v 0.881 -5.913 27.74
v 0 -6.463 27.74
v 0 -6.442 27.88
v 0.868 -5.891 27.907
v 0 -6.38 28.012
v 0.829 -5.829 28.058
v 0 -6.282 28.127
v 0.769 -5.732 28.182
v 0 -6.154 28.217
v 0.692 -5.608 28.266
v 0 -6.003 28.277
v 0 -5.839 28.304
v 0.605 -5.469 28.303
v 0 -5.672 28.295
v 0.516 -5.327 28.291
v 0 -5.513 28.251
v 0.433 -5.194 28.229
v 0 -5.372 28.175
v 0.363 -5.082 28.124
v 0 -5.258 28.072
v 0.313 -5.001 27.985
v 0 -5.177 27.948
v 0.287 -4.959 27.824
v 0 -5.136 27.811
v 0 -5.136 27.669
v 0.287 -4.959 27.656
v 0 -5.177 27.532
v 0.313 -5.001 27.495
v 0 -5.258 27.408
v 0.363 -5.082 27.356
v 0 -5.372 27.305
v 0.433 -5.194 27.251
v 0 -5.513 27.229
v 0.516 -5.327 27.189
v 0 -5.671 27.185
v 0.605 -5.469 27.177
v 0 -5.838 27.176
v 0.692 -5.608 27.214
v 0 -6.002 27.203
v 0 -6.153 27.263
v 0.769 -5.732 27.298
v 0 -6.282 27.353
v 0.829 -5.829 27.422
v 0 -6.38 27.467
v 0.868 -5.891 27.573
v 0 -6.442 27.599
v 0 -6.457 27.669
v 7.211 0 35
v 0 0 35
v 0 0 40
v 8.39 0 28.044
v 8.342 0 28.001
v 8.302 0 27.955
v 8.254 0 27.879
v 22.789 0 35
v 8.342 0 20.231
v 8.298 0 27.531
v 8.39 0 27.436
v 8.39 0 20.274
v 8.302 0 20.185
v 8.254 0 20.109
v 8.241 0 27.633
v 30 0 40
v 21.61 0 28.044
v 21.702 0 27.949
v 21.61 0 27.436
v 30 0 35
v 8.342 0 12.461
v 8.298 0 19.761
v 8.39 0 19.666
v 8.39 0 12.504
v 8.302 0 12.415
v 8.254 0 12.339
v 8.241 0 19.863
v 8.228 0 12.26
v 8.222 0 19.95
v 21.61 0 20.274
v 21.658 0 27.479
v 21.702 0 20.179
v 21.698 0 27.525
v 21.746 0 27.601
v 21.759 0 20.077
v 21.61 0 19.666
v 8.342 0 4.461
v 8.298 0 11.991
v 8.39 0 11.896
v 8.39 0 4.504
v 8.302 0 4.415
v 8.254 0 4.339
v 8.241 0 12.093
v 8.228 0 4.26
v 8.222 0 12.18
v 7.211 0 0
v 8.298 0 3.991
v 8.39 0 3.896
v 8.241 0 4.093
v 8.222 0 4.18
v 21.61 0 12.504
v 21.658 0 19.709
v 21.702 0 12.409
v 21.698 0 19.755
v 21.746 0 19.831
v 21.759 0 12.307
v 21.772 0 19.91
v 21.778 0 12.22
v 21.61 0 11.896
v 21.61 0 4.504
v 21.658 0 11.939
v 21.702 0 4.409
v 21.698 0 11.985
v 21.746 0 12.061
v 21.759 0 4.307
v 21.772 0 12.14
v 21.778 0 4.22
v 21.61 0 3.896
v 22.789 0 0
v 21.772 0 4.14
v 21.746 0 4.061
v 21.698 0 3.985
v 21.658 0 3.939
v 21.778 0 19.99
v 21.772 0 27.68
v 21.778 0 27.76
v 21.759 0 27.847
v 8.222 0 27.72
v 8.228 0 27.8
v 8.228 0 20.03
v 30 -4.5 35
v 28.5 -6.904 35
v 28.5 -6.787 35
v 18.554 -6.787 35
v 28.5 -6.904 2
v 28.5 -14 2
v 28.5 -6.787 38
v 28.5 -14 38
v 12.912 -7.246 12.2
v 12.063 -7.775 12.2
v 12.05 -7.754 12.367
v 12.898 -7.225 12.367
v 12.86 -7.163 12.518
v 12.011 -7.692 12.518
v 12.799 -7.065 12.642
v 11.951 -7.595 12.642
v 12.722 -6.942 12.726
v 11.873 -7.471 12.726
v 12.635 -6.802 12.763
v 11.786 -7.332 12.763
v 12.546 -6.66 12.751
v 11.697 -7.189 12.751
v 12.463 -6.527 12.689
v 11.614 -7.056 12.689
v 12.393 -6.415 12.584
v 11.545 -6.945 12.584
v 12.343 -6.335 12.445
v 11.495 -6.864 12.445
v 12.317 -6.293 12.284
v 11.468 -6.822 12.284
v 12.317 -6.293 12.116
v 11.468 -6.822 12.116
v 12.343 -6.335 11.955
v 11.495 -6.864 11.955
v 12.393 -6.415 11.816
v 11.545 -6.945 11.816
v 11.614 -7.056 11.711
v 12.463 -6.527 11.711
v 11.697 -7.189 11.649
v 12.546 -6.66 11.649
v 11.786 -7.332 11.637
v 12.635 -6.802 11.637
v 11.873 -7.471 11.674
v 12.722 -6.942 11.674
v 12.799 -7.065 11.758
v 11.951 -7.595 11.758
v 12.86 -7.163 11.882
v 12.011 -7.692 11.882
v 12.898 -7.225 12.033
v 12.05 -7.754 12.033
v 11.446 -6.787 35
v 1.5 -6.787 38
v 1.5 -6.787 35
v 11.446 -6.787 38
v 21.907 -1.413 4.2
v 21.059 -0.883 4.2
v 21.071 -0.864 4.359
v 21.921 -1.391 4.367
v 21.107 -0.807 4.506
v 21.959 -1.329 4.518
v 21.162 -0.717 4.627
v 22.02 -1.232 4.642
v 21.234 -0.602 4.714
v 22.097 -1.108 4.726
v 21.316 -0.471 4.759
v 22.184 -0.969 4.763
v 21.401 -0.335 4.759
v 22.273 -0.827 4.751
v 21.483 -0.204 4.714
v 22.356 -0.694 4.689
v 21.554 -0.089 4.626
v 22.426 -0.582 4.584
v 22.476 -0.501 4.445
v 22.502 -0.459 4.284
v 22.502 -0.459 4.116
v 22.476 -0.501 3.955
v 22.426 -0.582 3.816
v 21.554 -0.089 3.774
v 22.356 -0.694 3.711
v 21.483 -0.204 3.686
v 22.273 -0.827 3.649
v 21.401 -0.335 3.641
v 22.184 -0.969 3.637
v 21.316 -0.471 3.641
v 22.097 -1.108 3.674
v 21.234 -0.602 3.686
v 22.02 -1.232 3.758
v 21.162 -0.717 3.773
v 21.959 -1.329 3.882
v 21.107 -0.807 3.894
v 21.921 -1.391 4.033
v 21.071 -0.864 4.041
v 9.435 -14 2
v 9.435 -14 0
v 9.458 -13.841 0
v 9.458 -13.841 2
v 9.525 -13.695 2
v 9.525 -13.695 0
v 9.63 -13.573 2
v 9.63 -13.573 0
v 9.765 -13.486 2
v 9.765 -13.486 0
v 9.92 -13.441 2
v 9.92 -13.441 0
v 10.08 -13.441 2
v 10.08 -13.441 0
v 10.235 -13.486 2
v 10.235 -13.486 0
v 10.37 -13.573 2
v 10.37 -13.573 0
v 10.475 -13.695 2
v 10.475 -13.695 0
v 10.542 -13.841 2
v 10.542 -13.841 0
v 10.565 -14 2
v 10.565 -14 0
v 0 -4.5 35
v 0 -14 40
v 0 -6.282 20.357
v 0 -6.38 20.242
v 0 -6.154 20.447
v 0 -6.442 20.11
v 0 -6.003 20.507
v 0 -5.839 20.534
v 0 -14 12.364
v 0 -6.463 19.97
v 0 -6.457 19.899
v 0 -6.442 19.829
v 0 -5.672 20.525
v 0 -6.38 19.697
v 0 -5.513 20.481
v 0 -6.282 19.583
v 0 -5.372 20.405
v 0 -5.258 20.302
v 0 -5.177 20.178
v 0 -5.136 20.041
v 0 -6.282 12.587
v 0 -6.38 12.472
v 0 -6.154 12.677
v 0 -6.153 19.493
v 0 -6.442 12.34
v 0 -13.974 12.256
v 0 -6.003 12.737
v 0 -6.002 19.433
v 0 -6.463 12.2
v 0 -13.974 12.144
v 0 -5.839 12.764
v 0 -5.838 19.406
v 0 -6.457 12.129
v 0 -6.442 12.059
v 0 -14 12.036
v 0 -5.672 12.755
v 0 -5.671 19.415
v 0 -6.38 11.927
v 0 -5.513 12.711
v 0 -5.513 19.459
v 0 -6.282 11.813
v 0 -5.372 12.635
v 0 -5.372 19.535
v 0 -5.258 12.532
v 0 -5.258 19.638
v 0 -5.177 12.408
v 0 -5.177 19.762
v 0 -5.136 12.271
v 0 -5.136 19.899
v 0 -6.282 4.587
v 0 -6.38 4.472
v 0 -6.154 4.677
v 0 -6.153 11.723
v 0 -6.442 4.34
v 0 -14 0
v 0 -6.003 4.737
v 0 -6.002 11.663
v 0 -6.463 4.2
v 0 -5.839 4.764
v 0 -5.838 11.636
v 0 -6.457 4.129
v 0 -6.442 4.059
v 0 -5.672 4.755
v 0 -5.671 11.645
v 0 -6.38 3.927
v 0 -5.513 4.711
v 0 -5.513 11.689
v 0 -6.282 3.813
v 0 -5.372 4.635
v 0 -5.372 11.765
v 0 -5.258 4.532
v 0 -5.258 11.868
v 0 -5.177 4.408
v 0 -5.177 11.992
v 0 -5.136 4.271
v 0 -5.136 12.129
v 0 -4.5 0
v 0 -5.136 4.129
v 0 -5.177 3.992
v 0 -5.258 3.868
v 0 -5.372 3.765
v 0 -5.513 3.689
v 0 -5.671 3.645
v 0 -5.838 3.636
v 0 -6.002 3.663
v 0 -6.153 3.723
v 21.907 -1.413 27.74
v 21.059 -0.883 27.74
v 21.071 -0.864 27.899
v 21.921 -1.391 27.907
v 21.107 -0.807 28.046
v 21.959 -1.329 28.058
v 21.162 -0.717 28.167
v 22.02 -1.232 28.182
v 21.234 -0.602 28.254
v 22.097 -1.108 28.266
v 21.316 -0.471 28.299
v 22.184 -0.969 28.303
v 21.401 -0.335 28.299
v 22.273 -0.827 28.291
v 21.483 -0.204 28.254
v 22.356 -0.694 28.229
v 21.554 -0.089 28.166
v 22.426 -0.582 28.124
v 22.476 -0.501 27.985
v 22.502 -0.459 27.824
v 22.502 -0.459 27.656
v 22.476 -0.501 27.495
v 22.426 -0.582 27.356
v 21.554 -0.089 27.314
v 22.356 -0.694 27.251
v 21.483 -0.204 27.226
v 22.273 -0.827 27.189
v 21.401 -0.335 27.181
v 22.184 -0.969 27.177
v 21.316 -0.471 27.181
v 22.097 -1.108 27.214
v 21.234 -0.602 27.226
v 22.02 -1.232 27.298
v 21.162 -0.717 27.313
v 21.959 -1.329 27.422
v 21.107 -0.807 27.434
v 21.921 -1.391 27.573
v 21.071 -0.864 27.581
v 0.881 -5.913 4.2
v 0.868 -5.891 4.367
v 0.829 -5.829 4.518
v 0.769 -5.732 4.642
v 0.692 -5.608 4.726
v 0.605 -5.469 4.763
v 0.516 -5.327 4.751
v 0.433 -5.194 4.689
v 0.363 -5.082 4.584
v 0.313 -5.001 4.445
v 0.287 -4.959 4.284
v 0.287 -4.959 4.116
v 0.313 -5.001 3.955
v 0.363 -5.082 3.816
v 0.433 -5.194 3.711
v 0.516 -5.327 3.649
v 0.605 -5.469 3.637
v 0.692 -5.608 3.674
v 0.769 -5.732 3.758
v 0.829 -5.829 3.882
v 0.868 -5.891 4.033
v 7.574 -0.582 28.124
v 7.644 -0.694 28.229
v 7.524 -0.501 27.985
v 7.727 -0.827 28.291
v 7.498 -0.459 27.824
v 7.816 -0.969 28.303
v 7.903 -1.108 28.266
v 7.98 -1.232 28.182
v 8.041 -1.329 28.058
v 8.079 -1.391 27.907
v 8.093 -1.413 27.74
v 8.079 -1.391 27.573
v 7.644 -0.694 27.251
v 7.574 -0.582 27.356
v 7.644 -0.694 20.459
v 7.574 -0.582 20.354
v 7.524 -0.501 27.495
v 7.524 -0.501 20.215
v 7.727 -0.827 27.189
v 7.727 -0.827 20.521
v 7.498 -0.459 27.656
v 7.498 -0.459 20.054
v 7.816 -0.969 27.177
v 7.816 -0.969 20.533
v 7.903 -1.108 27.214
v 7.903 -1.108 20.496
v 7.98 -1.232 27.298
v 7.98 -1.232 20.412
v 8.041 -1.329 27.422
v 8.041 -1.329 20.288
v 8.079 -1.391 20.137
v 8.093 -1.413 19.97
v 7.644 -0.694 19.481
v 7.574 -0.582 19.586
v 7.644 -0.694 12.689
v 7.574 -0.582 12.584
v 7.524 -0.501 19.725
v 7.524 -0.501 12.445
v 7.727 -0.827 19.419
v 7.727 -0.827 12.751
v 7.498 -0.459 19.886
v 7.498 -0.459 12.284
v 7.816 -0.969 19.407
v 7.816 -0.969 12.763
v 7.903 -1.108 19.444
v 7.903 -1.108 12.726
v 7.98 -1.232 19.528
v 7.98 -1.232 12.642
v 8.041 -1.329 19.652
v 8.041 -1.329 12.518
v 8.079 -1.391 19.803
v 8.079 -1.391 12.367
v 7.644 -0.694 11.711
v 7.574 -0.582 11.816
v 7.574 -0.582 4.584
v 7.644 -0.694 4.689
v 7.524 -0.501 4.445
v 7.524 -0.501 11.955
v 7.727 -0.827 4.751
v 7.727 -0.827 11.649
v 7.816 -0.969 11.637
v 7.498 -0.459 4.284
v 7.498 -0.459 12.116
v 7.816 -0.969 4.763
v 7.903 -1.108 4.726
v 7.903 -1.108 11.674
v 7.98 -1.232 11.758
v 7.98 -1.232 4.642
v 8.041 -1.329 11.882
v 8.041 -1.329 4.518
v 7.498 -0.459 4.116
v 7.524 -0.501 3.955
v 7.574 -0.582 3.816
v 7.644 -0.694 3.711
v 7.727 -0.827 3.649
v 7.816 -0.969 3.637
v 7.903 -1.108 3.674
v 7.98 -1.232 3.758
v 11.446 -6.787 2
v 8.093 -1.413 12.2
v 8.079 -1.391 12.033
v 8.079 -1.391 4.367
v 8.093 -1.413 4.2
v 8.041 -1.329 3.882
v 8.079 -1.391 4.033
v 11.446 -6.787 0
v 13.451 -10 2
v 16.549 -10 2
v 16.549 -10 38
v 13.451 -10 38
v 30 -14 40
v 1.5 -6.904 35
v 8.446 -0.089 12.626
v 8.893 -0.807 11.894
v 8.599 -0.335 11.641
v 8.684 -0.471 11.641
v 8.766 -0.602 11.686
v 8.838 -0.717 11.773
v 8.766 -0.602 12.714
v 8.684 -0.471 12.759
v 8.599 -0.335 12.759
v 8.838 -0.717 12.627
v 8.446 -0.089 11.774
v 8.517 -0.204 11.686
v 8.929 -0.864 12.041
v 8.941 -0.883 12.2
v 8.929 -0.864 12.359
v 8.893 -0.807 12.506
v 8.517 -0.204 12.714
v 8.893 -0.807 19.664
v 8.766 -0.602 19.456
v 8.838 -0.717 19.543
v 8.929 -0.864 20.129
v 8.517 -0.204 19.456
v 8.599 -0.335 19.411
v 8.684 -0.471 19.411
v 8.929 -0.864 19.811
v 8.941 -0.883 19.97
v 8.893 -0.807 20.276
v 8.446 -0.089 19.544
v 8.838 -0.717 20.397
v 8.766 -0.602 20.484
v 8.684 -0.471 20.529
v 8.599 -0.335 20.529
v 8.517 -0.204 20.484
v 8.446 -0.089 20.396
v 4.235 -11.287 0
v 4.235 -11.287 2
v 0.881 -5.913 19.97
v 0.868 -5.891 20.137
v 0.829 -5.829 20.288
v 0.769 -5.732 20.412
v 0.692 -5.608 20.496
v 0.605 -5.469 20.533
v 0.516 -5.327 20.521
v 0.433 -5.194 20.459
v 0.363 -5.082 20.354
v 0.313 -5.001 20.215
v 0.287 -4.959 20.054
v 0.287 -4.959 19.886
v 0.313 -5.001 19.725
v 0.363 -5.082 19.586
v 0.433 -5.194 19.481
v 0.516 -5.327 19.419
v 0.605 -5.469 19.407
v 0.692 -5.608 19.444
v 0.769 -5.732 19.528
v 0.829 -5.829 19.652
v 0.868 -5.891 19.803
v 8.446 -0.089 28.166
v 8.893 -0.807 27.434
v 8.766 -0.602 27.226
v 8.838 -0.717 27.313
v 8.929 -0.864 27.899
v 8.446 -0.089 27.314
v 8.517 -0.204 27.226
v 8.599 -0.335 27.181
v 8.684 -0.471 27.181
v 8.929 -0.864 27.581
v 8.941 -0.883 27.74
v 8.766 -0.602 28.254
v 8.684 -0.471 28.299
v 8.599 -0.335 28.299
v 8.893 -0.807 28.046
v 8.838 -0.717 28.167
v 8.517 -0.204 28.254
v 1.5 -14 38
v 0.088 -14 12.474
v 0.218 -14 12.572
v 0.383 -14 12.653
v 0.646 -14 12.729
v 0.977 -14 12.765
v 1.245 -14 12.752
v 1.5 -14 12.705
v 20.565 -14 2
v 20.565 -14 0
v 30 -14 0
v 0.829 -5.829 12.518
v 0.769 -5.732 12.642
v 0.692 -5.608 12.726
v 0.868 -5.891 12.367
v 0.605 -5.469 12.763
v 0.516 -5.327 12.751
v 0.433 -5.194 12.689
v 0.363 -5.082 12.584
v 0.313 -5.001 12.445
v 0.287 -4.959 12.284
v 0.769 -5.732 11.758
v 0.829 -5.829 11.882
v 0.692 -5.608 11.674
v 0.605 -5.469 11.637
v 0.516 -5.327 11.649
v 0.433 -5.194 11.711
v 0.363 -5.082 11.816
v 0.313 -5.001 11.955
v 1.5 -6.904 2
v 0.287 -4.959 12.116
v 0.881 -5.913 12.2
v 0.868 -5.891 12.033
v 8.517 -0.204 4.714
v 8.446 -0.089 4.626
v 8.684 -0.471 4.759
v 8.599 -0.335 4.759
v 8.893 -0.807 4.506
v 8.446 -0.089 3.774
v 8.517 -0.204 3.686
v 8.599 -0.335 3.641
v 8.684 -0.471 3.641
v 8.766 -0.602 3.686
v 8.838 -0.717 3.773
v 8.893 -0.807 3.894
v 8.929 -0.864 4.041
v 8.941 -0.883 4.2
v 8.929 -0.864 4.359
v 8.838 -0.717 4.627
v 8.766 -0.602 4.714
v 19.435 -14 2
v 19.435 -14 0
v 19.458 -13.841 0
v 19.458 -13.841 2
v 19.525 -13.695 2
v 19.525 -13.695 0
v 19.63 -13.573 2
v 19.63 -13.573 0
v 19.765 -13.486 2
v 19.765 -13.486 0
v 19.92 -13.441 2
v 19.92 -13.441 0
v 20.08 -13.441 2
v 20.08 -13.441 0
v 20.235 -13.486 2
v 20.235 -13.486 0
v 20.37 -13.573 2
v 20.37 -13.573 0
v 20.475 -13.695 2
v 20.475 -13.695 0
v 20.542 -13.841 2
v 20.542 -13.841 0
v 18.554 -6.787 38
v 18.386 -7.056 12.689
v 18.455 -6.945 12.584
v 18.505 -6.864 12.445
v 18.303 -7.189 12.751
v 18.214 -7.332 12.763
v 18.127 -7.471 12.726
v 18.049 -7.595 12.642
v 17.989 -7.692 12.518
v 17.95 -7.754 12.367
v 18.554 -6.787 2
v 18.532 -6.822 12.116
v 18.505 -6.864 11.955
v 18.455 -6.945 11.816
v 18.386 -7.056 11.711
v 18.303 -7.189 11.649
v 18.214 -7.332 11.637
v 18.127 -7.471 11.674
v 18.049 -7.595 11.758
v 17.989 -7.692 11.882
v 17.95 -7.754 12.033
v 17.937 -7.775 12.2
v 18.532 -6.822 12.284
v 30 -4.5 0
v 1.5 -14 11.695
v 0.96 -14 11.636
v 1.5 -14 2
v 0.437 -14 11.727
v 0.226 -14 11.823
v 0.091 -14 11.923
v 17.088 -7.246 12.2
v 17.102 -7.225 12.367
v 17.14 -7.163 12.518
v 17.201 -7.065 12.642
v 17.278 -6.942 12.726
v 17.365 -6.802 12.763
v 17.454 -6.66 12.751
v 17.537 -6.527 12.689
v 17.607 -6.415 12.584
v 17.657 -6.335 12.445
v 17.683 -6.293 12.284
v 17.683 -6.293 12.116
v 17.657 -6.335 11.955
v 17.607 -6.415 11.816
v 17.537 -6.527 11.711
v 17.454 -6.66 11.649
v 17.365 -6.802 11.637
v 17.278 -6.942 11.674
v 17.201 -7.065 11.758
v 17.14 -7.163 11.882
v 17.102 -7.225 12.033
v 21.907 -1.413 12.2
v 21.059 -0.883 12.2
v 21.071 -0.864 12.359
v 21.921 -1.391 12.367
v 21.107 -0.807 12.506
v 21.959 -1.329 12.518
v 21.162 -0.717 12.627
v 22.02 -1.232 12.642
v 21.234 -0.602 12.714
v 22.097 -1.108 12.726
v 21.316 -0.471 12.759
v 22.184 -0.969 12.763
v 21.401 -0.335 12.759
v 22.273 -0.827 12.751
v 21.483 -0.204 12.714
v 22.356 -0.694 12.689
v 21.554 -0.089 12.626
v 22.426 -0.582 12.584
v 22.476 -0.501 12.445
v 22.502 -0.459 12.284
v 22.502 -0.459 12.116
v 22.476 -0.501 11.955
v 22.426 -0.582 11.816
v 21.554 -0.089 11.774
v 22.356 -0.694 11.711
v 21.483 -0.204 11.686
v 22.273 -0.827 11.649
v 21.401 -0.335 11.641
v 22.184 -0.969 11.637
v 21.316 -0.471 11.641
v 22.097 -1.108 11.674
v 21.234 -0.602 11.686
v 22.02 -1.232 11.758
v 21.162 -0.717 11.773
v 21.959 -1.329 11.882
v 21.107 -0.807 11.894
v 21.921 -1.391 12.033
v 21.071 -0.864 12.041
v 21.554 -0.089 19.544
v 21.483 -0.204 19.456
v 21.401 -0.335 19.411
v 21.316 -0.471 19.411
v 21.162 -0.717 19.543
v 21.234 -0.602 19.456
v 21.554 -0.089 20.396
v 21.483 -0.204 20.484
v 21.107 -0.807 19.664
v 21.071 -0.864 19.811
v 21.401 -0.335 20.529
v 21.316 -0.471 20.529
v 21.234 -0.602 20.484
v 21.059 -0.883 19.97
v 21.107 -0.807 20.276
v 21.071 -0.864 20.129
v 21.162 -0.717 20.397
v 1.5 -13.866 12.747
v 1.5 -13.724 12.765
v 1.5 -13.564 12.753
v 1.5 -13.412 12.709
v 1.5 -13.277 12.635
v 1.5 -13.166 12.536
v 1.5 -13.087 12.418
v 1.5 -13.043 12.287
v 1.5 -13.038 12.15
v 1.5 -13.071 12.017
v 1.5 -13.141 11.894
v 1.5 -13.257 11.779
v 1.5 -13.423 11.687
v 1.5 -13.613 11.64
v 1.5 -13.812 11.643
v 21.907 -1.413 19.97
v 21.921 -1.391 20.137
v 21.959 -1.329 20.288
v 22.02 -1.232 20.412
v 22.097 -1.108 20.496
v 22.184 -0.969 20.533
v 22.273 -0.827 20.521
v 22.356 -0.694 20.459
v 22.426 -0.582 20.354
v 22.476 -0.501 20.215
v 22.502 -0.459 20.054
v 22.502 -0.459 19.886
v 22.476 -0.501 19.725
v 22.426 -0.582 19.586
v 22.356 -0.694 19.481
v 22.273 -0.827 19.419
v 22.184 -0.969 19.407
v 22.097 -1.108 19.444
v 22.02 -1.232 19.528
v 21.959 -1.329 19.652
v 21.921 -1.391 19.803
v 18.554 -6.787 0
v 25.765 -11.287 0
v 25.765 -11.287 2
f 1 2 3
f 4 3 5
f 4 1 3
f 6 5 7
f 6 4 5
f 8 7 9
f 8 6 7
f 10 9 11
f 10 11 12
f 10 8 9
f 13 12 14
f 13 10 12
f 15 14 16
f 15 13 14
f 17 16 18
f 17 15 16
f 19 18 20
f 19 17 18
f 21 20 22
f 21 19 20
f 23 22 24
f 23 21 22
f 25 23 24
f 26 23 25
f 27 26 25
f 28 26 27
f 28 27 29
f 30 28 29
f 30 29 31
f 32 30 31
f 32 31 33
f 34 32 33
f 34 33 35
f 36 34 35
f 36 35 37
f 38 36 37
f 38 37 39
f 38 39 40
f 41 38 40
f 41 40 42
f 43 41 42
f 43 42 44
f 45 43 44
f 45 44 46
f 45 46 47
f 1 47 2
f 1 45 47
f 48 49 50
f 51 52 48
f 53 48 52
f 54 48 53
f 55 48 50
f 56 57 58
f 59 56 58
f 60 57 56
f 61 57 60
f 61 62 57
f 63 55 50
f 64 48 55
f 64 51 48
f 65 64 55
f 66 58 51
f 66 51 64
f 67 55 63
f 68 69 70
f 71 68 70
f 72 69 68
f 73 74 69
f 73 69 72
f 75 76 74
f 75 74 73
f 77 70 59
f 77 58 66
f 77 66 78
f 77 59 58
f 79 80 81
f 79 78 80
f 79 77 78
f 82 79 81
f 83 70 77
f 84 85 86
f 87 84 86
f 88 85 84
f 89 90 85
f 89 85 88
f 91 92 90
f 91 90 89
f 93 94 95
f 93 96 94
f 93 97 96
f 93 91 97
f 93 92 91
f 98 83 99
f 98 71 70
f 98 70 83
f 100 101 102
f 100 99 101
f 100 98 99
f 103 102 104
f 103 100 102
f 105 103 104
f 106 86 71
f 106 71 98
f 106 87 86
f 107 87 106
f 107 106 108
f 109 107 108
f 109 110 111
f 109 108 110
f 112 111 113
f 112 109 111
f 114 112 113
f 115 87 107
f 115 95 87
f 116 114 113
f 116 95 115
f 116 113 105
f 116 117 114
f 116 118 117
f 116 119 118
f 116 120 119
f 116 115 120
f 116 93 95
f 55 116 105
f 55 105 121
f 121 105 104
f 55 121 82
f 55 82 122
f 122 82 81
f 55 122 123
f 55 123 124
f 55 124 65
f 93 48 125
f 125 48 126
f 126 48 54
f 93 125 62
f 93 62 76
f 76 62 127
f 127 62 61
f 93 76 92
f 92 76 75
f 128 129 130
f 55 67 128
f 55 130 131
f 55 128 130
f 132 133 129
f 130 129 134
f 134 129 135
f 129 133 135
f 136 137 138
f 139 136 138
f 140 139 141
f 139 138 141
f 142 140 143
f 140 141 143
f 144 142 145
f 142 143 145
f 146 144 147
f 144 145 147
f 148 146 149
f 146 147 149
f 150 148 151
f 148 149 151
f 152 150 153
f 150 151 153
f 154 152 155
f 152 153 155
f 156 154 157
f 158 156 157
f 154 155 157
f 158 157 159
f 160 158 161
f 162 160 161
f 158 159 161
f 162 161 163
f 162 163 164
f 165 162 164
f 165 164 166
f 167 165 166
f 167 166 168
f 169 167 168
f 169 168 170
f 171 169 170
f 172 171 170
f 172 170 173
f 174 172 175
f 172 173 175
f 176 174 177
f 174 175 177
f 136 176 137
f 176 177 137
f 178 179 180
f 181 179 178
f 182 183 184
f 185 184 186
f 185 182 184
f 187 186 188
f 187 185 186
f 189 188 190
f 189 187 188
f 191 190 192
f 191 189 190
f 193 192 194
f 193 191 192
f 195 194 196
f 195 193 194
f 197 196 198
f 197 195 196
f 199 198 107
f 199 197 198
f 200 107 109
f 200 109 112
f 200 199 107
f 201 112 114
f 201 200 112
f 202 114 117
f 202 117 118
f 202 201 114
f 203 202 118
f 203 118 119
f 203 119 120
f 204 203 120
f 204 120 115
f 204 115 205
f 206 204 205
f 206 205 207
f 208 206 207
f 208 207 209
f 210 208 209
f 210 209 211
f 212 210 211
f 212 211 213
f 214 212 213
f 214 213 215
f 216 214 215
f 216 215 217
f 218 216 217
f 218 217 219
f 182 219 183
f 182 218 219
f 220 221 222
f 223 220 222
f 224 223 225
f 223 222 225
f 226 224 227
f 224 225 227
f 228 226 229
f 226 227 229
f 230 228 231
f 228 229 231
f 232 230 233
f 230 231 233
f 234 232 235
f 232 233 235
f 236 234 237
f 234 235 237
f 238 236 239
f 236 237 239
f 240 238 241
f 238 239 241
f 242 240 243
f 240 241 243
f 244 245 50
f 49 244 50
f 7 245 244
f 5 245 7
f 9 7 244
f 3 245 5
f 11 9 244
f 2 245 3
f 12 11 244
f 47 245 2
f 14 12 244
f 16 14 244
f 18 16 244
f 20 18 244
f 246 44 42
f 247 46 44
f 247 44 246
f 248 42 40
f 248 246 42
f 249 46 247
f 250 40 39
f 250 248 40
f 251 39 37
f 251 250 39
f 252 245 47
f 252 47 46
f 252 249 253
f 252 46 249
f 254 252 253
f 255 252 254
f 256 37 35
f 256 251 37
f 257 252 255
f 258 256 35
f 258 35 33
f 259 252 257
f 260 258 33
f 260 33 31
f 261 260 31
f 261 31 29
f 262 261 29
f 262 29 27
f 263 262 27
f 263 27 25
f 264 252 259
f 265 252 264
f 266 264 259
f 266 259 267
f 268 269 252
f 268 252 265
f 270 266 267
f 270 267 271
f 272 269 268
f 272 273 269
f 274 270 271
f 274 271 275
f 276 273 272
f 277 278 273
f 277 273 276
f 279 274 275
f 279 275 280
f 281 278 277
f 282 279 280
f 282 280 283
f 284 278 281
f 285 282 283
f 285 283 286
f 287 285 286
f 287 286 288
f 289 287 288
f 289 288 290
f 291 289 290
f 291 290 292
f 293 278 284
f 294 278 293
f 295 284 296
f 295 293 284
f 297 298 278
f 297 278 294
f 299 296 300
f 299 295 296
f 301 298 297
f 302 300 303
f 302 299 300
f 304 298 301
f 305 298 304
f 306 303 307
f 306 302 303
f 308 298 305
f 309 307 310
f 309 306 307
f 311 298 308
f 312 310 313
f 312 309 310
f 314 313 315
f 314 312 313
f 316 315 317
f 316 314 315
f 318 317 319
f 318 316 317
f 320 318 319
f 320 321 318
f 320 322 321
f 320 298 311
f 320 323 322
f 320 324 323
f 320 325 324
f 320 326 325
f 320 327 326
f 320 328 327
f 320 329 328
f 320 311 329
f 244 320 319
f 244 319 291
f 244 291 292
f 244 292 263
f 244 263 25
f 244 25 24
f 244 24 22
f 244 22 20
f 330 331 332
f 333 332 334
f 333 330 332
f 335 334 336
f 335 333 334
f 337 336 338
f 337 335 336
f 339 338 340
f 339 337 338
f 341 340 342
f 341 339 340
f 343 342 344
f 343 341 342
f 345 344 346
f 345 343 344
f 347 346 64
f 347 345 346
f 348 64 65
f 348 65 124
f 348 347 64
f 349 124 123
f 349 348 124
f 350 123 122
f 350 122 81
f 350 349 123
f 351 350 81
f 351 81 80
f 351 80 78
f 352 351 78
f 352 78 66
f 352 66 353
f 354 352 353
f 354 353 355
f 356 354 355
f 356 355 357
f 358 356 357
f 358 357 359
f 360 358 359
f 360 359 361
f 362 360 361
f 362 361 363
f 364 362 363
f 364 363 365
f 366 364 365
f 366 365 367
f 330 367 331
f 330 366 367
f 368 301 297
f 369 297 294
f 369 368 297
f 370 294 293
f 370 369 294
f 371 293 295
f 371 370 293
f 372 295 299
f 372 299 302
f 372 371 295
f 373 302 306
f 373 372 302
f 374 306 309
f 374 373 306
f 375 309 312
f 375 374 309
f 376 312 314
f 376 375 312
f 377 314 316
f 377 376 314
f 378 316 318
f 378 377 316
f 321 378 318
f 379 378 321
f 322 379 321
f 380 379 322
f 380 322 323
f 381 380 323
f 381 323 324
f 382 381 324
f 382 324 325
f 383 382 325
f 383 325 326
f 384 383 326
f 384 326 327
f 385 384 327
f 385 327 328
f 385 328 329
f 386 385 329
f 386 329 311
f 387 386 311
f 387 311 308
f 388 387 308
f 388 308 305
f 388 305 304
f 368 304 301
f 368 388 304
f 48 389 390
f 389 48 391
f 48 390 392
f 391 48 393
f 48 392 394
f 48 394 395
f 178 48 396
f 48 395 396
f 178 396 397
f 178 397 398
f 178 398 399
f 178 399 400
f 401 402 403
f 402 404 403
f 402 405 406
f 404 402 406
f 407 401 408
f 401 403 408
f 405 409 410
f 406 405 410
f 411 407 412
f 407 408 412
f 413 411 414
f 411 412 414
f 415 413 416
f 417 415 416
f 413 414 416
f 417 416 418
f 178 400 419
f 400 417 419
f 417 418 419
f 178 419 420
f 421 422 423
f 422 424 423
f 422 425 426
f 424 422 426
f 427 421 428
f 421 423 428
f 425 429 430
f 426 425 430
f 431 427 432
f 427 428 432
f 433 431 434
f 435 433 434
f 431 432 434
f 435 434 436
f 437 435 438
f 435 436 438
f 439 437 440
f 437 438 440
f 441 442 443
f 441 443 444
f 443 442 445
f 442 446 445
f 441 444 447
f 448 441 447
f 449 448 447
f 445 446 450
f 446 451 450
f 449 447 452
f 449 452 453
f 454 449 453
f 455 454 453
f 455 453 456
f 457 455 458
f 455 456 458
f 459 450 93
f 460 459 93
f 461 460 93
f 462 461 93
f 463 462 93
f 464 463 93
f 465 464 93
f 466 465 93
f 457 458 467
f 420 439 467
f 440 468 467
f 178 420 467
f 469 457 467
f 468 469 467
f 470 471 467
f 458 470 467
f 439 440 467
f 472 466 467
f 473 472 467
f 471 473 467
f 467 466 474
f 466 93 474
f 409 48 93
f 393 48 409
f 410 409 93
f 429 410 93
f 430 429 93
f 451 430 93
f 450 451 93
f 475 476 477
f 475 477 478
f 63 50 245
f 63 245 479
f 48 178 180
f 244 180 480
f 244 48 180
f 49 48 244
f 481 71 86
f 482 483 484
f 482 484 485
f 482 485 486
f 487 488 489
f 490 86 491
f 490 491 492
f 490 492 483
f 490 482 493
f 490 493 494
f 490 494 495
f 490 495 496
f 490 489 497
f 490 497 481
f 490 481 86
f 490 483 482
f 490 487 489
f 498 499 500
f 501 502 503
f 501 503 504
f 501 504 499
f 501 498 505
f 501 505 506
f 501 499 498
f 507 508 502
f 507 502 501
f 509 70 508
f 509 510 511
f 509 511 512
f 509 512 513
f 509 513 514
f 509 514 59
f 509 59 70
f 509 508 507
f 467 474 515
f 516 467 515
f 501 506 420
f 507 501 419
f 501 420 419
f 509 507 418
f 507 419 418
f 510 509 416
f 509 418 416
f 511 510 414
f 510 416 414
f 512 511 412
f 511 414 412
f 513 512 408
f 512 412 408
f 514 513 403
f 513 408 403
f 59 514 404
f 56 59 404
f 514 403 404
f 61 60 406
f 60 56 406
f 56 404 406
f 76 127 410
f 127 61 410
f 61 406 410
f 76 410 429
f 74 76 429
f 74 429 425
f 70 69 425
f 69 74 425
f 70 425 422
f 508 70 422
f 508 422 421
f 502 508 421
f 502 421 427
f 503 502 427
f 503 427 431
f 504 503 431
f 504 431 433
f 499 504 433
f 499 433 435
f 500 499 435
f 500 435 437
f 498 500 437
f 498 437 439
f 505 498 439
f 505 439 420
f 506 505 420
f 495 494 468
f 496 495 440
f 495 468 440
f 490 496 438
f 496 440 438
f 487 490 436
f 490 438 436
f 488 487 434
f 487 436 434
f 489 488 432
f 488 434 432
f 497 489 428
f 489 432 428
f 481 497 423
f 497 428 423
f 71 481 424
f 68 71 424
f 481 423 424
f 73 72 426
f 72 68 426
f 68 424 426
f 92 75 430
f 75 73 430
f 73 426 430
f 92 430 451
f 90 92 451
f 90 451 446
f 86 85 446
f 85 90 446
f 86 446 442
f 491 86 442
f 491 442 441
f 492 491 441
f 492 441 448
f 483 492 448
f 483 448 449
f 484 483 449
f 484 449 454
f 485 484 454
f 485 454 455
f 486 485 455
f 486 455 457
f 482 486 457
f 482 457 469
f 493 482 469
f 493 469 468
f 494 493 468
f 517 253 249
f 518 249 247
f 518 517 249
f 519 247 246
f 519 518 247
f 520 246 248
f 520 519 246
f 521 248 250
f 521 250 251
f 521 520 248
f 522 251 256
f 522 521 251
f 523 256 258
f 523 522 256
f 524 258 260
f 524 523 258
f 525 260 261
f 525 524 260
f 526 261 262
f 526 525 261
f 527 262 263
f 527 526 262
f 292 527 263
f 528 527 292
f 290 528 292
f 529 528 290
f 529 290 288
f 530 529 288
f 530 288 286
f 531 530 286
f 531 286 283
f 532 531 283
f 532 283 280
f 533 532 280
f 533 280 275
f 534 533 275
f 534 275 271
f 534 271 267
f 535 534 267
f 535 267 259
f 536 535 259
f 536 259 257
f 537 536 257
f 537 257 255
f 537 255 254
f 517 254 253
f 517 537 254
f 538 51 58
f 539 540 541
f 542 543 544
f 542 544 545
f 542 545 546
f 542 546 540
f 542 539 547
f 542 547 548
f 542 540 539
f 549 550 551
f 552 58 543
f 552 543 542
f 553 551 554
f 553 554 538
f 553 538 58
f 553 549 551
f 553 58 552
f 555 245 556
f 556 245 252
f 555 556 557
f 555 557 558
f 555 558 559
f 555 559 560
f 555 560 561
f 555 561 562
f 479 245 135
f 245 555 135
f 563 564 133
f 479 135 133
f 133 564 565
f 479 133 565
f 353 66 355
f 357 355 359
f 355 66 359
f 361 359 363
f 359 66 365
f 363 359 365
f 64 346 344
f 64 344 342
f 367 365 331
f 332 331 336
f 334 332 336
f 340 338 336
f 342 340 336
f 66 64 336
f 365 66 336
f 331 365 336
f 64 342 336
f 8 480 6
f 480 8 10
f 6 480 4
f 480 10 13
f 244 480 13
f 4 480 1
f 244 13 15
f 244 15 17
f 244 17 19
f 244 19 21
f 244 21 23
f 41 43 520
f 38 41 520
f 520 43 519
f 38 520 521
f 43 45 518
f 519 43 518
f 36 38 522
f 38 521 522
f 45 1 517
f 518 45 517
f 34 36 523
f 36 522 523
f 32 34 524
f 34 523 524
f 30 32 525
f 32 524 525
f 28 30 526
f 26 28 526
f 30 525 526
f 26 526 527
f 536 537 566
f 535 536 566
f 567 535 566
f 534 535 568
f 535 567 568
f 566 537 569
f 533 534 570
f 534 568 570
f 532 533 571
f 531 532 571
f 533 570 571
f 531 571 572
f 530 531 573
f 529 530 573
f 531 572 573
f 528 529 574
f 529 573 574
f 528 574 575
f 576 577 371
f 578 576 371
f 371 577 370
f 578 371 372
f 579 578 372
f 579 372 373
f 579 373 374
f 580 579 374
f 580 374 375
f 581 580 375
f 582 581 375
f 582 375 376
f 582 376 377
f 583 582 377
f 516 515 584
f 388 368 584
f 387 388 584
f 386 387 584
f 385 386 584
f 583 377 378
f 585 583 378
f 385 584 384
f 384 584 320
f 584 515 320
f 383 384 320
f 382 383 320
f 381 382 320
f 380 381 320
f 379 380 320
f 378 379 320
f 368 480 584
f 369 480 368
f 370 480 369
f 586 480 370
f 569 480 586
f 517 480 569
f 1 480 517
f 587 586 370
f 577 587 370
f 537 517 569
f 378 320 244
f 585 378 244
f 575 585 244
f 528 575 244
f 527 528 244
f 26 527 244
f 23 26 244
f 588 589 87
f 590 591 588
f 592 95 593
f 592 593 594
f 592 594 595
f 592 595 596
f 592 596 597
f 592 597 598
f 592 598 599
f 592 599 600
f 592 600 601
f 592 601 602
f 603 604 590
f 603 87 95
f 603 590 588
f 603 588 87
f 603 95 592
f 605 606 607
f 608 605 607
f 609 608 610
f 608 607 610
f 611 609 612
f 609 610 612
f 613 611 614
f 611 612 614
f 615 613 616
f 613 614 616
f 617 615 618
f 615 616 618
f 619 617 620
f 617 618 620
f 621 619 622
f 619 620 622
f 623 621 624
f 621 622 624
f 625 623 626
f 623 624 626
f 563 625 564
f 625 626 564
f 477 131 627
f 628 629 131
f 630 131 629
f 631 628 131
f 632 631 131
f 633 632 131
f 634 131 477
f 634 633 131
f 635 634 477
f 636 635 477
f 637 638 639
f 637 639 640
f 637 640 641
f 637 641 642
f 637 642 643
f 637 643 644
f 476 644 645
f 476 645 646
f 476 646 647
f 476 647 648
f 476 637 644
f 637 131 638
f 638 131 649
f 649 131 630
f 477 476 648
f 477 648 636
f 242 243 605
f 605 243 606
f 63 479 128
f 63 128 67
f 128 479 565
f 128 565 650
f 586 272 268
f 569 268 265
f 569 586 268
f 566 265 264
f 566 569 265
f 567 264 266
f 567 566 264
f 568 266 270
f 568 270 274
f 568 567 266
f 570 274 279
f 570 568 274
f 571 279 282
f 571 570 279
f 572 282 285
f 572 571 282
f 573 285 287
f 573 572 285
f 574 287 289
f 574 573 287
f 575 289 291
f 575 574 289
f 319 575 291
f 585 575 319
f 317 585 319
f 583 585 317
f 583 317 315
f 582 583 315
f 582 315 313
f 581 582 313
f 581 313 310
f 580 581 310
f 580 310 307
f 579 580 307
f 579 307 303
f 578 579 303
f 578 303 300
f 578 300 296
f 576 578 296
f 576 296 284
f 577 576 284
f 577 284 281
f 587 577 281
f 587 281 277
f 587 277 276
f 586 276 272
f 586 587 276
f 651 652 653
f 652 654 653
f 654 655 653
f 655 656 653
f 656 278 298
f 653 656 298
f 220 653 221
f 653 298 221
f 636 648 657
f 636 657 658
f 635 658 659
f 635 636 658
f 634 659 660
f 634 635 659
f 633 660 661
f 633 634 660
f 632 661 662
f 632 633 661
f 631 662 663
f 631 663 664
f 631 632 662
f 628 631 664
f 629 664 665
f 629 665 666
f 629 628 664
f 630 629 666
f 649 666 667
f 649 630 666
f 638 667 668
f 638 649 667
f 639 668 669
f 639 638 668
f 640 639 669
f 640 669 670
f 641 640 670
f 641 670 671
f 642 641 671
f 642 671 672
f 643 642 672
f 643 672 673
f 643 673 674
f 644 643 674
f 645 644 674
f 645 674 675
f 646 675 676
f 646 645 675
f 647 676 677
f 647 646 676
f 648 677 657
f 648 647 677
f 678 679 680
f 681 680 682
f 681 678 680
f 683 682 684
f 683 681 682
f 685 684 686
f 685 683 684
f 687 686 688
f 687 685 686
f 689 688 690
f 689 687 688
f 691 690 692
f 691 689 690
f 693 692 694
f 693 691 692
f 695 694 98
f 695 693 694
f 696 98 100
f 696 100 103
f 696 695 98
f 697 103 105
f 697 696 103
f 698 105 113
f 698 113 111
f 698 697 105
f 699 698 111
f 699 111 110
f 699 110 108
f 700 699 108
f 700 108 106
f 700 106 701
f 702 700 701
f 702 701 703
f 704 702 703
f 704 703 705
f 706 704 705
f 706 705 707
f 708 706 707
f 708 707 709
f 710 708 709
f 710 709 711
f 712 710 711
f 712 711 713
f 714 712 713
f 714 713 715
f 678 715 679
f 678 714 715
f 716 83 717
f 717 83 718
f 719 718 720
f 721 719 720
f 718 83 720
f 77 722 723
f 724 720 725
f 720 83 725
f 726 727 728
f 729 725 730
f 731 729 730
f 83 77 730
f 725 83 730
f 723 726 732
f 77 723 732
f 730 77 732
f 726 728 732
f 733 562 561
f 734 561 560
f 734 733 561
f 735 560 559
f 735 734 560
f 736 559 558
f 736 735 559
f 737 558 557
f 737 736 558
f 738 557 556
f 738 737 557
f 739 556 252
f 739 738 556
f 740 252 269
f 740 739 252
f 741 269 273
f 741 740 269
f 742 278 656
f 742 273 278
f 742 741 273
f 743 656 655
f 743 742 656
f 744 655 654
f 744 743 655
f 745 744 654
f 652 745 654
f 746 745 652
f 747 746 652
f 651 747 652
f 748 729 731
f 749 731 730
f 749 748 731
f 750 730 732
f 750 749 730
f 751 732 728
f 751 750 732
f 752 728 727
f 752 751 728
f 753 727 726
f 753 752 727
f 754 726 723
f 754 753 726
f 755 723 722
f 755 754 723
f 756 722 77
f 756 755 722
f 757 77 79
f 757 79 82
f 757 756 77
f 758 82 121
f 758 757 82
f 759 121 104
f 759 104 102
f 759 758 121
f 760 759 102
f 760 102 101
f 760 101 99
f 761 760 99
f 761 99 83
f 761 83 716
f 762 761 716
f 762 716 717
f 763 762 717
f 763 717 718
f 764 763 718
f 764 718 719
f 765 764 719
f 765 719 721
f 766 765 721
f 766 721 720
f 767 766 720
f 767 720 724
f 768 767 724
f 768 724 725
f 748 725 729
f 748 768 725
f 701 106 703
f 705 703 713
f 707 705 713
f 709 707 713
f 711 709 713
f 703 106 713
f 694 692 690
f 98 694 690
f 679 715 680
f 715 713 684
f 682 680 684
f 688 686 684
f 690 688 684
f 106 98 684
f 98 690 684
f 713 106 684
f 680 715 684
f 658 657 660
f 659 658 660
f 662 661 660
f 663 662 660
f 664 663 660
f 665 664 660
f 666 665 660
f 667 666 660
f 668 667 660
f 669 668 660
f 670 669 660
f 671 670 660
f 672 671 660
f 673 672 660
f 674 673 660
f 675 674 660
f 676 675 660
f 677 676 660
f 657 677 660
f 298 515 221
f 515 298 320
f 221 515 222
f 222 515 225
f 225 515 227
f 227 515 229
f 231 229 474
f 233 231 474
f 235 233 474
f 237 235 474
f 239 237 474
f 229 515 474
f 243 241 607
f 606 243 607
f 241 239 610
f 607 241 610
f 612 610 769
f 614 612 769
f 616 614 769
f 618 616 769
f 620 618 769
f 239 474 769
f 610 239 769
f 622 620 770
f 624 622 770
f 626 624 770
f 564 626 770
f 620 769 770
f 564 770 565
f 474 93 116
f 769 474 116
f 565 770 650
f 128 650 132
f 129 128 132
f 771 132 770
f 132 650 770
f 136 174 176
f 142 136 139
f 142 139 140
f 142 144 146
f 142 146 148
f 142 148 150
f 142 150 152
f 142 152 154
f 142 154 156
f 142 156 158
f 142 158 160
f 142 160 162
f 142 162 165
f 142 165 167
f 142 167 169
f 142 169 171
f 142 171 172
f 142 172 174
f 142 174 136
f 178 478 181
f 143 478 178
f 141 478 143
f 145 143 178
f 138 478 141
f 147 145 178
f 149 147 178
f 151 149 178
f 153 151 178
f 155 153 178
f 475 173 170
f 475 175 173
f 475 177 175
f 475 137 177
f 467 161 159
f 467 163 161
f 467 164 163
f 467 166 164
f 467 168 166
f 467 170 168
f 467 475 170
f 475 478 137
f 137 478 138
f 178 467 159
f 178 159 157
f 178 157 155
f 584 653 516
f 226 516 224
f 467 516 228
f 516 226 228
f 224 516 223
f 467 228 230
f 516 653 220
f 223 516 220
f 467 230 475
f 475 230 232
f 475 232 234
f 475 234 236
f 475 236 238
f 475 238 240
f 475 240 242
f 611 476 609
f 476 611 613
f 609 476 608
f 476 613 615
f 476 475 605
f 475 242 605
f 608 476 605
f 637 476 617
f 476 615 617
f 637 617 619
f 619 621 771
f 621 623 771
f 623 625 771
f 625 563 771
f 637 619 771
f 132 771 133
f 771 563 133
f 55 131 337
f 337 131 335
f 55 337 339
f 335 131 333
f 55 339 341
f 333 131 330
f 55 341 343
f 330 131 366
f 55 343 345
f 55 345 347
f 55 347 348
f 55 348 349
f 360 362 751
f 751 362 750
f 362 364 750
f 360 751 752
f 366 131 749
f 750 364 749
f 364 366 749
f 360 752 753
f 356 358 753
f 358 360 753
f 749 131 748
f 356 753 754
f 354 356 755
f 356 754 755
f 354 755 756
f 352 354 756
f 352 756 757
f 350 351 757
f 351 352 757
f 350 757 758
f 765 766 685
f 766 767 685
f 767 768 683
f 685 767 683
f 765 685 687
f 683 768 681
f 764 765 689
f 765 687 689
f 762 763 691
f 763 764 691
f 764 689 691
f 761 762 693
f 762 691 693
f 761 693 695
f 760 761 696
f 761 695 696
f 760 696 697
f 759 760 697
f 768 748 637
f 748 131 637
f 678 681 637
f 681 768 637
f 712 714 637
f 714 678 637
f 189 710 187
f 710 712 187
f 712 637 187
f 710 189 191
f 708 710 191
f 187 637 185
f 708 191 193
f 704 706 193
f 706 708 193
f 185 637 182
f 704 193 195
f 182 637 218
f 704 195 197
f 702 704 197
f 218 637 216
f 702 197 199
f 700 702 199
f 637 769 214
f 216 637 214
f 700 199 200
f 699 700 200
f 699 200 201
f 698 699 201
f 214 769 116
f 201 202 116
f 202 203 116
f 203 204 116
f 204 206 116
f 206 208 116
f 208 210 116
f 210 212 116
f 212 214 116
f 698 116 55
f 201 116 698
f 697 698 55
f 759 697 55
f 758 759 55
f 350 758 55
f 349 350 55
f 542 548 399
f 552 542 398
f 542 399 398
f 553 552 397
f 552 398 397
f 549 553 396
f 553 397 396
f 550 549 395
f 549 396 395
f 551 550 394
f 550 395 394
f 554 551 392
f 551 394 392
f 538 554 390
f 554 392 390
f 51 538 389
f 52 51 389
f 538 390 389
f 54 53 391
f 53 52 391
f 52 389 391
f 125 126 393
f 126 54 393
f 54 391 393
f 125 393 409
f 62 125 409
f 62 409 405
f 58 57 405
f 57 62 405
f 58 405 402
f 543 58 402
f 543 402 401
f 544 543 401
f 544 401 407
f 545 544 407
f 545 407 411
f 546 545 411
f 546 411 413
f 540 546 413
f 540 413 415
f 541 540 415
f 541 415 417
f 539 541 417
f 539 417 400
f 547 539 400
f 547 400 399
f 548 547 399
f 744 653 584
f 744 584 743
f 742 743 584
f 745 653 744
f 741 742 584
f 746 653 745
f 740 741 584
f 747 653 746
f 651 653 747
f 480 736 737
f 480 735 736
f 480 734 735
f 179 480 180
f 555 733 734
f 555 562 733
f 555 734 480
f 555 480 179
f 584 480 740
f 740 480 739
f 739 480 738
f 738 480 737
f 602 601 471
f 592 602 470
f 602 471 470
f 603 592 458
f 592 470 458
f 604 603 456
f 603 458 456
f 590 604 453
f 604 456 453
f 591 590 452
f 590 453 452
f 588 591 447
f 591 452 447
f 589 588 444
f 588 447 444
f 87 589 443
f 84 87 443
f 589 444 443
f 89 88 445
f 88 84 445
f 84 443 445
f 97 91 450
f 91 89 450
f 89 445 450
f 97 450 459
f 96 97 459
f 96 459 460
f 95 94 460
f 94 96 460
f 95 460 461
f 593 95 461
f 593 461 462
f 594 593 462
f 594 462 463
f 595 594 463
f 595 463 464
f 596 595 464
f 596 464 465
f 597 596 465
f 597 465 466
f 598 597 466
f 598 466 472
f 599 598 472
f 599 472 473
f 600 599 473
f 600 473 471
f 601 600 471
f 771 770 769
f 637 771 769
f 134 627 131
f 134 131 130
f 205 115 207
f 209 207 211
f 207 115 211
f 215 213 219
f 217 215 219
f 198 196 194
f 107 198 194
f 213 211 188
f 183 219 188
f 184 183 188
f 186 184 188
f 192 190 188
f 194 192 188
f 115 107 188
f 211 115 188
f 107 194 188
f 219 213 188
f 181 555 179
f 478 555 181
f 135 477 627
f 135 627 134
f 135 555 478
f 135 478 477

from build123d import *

# Parameters (mm, degrees)
SKETCH_1_W          = 30
SKETCH_1_H          = 14
EXTRUDE_1_DEPTH     = 40
CUT_EXTRUDE_1_DEPTH = 35
SKETCH_4_W          = 27
SKETCH_4_H          = 36
CUT_EXTRUDE_2_DEPTH = 7.21308
SKETCH_5_R          = 0.565
CUT_EXTRUDE_3_DEPTH = 10
EXTRUDE_2_REACH     = 53.923
SKETCH_6_R          = 0.565
CUT_EXTRUDE_4_DEPTH = 1
SKETCH_8_R          = 0.565
CUT_EXTRUDE_5_DEPTH = 51.1269475


with BuildPart() as part:
    # 草图1 → 凸台-拉伸1 (new body)
    with BuildSketch(Plane.XY):
        with Locations((15, -7)):
            Rectangle(SKETCH_1_W, SKETCH_1_H)
    extrude(amount=EXTRUDE_1_DEPTH)

    # 草图3 → 切除-拉伸1 (cut)
    with BuildSketch(Plane(origin=(0, 0, 0), x_dir=(-1, 0, 0), z_dir=(0, 0, -1))):
        Polygon((-30, -4.5), (-25.764705882, -11.286920048), (-18.553603331, -6.786920048), (-22.788897449, 0), (-30, 0), align=None)
        Polygon((-7.211102551, 0), (-11.446396669, -6.786920048), (-4.235294118, -11.286920048), (0, -4.5), (0, 0), align=None)
    extrude(amount=-CUT_EXTRUDE_1_DEPTH, mode=Mode.SUBTRACT)

    # 草图4 → 切除-拉伸2 (cut)
    with BuildSketch(Plane.XZ.offset(14)):
        with Locations((15, 20)):
            Rectangle(SKETCH_4_W, SKETCH_4_H)
    extrude(amount=-CUT_EXTRUDE_2_DEPTH, mode=Mode.SUBTRACT)

    # 草图5 → 切除-拉伸3 (cut)
    with BuildSketch(Plane(origin=(0, 0, 0), x_dir=(-1, 0, 0), z_dir=(0, 0, -1))):
        with Locations((-10, -14)):
            Circle(SKETCH_5_R)
        with Locations((-20, -14)):
            Circle(SKETCH_5_R)
    extrude(amount=-CUT_EXTRUDE_3_DEPTH, mode=Mode.SUBTRACT)

    # 草图7 → 凸台-拉伸2 (add, up to next)
    with BuildSketch(Plane(origin=(0, 0, 0), x_dir=(-1, 0, 0), z_dir=(0, 0, -1)), mode=Mode.PRIVATE) as extrude_2_sk1:
        Polygon((-22.788897449, 0), (-18.553603331, -6.786920048), (-16.548520242, -10), (-13.451479758, -10), (-11.446396669, -6.786920048), (-7.211102551, 0), align=None)
    extrude_2_tool1 = extrude(extrude_2_sk1.sketch, amount=-EXTRUDE_2_REACH, mode=Mode.PRIVATE) - part.part
    add(extrude_2_tool1.solids().sort_by_distance((15, -3.886134, 0))[0])

    # 草图6 → 切除-拉伸4 (cut)
    with BuildSketch(Plane(origin=(5.189997684, 3.238754325, 0), x_dir=(0, 0, 1), z_dir=(-0.8483650059915271, -0.5294117647058821, 0))):
        with Locations(Location((12.2, -12.417642527, 0), (0, 0, 270))):
            Circle(SKETCH_6_R)
        with Locations(Location((12.2, -4.917642527, 0), (0, 0, 270))):
            Circle(SKETCH_6_R)
        with Locations(Location((4.2, -4.917642527, 0), (0, 0, 270))):
            Circle(SKETCH_6_R)
        with Locations(Location((19.97, -4.917642527, 0), (0, 0, 270))):
            Circle(SKETCH_6_R)
        with Locations(Location((27.74, -4.917642527, 0), (0, 0, 270))):
            Circle(SKETCH_6_R)
    cut_extrude_4 = extrude(amount=-CUT_EXTRUDE_4_DEPTH, mode=Mode.SUBTRACT)

    # 镜向1: 切除-拉伸4 across plane
    add(cut_extrude_4.mirror(Plane(origin=(15, 0, 0), x_dir=(0, 0, 1), z_dir=(1, 0, 0))), mode=Mode.SUBTRACT)

    # 草图8 → 切除-拉伸5 (cut, through all)
    with BuildSketch(Plane(origin=(5.189997684, 3.238754325, 0), x_dir=(0, 0, 1), z_dir=(-0.8483650059915271, -0.5294117647058821, 0))):
        with Locations(Location((12.2, -12.417642527, 0), (0, 0, 270))):
            Circle(SKETCH_8_R)
        with Locations(Location((4.2, -4.917642527, 0), (0, 0, 270))):
            Circle(SKETCH_8_R)
        with Locations(Location((27.74, -4.917642527, 0), (0, 0, 270))):
            Circle(SKETCH_8_R)
        with Locations(Location((19.97, -4.917642527, 0), (0, 0, 270))):
            Circle(SKETCH_8_R)
        with Locations(Location((12.2, -4.917642527, 0), (0, 0, 270))):
            Circle(SKETCH_8_R)
    extrude(amount=CUT_EXTRUDE_5_DEPTH, mode=Mode.SUBTRACT)


solid = part.part
